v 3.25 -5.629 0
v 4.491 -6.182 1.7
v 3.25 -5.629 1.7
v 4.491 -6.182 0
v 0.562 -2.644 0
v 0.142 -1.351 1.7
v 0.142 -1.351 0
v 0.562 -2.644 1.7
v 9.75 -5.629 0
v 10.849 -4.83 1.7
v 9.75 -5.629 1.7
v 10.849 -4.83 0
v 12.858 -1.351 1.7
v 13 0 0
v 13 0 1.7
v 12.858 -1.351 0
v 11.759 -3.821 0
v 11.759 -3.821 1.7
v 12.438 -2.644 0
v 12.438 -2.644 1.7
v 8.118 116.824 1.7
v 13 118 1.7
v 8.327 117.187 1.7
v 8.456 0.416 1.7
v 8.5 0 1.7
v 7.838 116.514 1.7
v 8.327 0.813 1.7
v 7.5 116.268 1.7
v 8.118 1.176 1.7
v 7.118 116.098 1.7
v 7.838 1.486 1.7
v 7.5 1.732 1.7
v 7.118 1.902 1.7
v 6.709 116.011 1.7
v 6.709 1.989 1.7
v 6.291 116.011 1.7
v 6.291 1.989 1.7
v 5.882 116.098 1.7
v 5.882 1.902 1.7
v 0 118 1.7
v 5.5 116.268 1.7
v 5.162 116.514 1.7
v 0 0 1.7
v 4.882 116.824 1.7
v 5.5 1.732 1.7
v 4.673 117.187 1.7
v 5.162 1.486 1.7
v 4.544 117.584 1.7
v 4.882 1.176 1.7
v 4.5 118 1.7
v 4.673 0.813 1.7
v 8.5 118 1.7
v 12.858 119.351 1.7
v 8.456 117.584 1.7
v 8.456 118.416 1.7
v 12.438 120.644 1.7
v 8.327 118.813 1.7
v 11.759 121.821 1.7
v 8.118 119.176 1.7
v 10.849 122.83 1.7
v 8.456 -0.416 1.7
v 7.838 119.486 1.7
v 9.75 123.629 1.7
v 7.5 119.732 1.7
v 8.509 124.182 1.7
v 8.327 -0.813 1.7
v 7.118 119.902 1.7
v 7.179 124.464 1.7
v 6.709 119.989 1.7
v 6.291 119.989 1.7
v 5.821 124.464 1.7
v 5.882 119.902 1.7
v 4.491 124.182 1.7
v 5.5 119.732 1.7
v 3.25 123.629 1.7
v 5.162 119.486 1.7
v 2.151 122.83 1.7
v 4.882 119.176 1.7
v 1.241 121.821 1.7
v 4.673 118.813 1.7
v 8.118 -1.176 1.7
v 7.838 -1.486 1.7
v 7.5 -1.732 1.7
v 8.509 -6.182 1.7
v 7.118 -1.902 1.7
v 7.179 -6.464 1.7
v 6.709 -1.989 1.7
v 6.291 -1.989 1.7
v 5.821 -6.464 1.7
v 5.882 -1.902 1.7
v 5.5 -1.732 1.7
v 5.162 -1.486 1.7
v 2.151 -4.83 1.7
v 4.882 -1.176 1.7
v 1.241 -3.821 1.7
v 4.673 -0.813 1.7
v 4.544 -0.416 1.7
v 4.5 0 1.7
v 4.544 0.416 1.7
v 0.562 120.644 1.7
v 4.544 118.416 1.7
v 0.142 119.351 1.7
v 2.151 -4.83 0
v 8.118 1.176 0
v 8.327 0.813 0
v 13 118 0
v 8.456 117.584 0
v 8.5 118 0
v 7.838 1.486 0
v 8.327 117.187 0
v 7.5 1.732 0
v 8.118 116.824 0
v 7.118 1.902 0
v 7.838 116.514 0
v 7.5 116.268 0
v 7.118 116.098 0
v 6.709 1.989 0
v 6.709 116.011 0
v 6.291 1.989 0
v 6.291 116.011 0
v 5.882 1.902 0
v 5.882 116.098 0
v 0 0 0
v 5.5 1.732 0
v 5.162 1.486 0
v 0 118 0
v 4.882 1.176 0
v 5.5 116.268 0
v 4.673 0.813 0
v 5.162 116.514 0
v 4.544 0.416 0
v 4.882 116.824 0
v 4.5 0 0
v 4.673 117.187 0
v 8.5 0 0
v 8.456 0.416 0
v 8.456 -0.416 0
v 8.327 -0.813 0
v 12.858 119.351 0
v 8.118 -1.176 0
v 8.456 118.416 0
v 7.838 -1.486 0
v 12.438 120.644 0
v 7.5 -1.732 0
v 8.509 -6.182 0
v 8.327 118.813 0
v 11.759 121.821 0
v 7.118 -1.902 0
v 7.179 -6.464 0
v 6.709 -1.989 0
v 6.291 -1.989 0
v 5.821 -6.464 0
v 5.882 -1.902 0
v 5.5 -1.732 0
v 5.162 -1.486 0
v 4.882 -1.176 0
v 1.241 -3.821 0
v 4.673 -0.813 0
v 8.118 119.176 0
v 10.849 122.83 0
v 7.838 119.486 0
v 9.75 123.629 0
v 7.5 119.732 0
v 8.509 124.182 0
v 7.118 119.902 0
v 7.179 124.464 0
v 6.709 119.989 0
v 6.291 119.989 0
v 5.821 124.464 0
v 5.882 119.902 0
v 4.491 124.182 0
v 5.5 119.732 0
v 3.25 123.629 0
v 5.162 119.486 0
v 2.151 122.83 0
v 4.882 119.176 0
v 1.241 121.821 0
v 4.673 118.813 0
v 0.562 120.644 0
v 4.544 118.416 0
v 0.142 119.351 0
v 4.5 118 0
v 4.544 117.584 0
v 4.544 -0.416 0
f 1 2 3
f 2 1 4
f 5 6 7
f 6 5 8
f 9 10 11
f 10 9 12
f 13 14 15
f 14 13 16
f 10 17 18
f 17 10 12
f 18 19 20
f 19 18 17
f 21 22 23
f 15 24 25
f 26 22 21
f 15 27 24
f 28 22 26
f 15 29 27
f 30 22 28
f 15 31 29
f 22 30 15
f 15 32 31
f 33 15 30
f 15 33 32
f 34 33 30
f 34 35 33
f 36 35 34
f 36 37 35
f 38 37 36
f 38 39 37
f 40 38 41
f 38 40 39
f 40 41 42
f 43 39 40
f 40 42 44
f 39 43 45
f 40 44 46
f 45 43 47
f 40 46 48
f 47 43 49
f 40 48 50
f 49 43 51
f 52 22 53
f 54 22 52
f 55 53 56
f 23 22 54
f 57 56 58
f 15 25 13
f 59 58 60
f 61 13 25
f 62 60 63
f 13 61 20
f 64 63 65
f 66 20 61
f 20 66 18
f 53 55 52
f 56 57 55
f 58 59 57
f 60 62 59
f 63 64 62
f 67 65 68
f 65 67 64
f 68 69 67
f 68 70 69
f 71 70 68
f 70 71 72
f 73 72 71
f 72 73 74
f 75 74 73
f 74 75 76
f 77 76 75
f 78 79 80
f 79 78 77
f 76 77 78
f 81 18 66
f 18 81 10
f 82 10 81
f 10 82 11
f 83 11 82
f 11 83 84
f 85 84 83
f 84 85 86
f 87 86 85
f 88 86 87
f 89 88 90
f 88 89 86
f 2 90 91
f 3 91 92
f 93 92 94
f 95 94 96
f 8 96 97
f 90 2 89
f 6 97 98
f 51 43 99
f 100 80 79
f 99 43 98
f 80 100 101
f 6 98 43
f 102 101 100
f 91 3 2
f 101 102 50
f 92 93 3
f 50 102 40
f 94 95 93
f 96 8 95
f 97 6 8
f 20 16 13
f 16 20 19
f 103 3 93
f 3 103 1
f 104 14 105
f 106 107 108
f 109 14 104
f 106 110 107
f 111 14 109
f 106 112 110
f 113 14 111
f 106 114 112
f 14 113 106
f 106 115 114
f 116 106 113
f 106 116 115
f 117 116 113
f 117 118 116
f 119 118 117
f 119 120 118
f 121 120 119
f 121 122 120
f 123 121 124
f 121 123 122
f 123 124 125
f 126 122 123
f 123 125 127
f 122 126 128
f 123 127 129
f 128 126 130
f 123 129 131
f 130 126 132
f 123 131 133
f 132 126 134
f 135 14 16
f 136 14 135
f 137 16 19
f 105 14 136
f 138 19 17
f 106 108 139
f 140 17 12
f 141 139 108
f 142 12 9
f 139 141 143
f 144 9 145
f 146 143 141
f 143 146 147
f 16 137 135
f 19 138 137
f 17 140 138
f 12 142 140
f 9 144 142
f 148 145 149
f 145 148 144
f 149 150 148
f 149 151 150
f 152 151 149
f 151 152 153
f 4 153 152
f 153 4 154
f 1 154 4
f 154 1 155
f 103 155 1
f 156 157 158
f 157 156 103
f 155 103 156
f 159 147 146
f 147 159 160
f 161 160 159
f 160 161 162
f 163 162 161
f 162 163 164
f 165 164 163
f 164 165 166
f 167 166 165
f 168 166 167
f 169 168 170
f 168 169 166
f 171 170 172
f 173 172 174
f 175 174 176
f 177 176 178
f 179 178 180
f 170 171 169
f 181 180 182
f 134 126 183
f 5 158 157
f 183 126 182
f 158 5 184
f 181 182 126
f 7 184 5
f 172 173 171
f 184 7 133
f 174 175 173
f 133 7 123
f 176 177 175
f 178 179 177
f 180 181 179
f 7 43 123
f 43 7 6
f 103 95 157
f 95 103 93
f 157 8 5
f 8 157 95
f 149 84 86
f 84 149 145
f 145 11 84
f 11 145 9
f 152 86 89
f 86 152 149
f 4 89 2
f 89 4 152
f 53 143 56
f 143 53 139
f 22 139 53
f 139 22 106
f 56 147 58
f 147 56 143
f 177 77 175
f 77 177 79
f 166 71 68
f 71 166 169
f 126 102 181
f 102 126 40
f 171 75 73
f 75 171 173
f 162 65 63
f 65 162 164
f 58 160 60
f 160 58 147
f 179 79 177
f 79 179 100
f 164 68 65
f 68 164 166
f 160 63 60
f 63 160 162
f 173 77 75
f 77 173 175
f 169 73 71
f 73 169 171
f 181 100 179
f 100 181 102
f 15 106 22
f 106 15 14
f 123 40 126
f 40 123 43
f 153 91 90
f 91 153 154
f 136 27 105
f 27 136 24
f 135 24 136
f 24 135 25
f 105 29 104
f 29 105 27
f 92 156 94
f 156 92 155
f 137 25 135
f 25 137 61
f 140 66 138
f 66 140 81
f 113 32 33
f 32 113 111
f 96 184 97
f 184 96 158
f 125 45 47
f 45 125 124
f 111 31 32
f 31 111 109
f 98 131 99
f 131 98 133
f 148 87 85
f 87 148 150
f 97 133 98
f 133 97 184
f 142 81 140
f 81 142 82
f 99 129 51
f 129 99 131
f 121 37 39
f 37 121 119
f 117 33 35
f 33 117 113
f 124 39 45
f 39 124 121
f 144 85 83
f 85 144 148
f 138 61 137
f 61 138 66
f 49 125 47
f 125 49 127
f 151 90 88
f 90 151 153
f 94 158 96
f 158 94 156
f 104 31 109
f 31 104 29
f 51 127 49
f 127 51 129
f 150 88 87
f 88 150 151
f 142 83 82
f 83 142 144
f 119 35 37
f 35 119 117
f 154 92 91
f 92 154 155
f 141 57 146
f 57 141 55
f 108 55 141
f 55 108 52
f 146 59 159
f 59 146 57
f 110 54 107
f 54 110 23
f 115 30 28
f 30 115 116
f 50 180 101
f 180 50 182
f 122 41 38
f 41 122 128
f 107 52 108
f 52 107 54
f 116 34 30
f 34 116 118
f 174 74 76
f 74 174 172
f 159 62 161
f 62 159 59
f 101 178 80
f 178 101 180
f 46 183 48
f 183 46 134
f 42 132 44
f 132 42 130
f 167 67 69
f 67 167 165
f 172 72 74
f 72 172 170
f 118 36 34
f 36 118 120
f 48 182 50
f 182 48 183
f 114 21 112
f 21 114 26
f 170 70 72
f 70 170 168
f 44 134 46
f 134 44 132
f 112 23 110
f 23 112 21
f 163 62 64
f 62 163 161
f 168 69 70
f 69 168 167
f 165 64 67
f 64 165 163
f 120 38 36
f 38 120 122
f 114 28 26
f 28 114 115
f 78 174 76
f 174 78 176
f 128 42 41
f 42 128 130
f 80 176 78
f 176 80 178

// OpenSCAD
//Resolution of the curves.(Higher = more polygons and higher load time)
$fn = 30;
//What would you like the width to be?(mm)
widthOfBody     = 13;
//What would you like the height to be?(mm)
heightOfBody    = 1.7;
//How many slots do you want?(int)
numberOfSlots   = 10;
//How wide should the slots be?(mm)
widthOfSlots    = 6;
//How wide should the screw hole be?(mm)
widthOfScrew    = 4;
//How wide do you want the seperating walls?(mm)
widthOfWalls    = 5;


lengthOfBody    = (widthOfBody) + ( widthOfSlots * numberOfSlots ) + ( widthOfWalls * ( numberOfSlots - 1 ) );
difference(){
    union(){
        cube([widthOfBody, lengthOfBody, heightOfBody]);
        translate([ widthOfBody / 2, 0, 0]){
            cylinder( d = widthOfBody, h = heightOfBody );
            translate([ 0, lengthOfBody, 0]){
                cylinder( d = widthOfBody, h = heightOfBody );
            }
        }
    }
    union(){
        translate([ widthOfBody / 2, 0, -1 ]){
            cylinder( d = widthOfScrew, h = heightOfBody + 2 );
            translate([ 0, lengthOfBody, 0]){
                cylinder( d = widthOfScrew, h = heightOfBody + 2 );
            }
        }
    }
}
